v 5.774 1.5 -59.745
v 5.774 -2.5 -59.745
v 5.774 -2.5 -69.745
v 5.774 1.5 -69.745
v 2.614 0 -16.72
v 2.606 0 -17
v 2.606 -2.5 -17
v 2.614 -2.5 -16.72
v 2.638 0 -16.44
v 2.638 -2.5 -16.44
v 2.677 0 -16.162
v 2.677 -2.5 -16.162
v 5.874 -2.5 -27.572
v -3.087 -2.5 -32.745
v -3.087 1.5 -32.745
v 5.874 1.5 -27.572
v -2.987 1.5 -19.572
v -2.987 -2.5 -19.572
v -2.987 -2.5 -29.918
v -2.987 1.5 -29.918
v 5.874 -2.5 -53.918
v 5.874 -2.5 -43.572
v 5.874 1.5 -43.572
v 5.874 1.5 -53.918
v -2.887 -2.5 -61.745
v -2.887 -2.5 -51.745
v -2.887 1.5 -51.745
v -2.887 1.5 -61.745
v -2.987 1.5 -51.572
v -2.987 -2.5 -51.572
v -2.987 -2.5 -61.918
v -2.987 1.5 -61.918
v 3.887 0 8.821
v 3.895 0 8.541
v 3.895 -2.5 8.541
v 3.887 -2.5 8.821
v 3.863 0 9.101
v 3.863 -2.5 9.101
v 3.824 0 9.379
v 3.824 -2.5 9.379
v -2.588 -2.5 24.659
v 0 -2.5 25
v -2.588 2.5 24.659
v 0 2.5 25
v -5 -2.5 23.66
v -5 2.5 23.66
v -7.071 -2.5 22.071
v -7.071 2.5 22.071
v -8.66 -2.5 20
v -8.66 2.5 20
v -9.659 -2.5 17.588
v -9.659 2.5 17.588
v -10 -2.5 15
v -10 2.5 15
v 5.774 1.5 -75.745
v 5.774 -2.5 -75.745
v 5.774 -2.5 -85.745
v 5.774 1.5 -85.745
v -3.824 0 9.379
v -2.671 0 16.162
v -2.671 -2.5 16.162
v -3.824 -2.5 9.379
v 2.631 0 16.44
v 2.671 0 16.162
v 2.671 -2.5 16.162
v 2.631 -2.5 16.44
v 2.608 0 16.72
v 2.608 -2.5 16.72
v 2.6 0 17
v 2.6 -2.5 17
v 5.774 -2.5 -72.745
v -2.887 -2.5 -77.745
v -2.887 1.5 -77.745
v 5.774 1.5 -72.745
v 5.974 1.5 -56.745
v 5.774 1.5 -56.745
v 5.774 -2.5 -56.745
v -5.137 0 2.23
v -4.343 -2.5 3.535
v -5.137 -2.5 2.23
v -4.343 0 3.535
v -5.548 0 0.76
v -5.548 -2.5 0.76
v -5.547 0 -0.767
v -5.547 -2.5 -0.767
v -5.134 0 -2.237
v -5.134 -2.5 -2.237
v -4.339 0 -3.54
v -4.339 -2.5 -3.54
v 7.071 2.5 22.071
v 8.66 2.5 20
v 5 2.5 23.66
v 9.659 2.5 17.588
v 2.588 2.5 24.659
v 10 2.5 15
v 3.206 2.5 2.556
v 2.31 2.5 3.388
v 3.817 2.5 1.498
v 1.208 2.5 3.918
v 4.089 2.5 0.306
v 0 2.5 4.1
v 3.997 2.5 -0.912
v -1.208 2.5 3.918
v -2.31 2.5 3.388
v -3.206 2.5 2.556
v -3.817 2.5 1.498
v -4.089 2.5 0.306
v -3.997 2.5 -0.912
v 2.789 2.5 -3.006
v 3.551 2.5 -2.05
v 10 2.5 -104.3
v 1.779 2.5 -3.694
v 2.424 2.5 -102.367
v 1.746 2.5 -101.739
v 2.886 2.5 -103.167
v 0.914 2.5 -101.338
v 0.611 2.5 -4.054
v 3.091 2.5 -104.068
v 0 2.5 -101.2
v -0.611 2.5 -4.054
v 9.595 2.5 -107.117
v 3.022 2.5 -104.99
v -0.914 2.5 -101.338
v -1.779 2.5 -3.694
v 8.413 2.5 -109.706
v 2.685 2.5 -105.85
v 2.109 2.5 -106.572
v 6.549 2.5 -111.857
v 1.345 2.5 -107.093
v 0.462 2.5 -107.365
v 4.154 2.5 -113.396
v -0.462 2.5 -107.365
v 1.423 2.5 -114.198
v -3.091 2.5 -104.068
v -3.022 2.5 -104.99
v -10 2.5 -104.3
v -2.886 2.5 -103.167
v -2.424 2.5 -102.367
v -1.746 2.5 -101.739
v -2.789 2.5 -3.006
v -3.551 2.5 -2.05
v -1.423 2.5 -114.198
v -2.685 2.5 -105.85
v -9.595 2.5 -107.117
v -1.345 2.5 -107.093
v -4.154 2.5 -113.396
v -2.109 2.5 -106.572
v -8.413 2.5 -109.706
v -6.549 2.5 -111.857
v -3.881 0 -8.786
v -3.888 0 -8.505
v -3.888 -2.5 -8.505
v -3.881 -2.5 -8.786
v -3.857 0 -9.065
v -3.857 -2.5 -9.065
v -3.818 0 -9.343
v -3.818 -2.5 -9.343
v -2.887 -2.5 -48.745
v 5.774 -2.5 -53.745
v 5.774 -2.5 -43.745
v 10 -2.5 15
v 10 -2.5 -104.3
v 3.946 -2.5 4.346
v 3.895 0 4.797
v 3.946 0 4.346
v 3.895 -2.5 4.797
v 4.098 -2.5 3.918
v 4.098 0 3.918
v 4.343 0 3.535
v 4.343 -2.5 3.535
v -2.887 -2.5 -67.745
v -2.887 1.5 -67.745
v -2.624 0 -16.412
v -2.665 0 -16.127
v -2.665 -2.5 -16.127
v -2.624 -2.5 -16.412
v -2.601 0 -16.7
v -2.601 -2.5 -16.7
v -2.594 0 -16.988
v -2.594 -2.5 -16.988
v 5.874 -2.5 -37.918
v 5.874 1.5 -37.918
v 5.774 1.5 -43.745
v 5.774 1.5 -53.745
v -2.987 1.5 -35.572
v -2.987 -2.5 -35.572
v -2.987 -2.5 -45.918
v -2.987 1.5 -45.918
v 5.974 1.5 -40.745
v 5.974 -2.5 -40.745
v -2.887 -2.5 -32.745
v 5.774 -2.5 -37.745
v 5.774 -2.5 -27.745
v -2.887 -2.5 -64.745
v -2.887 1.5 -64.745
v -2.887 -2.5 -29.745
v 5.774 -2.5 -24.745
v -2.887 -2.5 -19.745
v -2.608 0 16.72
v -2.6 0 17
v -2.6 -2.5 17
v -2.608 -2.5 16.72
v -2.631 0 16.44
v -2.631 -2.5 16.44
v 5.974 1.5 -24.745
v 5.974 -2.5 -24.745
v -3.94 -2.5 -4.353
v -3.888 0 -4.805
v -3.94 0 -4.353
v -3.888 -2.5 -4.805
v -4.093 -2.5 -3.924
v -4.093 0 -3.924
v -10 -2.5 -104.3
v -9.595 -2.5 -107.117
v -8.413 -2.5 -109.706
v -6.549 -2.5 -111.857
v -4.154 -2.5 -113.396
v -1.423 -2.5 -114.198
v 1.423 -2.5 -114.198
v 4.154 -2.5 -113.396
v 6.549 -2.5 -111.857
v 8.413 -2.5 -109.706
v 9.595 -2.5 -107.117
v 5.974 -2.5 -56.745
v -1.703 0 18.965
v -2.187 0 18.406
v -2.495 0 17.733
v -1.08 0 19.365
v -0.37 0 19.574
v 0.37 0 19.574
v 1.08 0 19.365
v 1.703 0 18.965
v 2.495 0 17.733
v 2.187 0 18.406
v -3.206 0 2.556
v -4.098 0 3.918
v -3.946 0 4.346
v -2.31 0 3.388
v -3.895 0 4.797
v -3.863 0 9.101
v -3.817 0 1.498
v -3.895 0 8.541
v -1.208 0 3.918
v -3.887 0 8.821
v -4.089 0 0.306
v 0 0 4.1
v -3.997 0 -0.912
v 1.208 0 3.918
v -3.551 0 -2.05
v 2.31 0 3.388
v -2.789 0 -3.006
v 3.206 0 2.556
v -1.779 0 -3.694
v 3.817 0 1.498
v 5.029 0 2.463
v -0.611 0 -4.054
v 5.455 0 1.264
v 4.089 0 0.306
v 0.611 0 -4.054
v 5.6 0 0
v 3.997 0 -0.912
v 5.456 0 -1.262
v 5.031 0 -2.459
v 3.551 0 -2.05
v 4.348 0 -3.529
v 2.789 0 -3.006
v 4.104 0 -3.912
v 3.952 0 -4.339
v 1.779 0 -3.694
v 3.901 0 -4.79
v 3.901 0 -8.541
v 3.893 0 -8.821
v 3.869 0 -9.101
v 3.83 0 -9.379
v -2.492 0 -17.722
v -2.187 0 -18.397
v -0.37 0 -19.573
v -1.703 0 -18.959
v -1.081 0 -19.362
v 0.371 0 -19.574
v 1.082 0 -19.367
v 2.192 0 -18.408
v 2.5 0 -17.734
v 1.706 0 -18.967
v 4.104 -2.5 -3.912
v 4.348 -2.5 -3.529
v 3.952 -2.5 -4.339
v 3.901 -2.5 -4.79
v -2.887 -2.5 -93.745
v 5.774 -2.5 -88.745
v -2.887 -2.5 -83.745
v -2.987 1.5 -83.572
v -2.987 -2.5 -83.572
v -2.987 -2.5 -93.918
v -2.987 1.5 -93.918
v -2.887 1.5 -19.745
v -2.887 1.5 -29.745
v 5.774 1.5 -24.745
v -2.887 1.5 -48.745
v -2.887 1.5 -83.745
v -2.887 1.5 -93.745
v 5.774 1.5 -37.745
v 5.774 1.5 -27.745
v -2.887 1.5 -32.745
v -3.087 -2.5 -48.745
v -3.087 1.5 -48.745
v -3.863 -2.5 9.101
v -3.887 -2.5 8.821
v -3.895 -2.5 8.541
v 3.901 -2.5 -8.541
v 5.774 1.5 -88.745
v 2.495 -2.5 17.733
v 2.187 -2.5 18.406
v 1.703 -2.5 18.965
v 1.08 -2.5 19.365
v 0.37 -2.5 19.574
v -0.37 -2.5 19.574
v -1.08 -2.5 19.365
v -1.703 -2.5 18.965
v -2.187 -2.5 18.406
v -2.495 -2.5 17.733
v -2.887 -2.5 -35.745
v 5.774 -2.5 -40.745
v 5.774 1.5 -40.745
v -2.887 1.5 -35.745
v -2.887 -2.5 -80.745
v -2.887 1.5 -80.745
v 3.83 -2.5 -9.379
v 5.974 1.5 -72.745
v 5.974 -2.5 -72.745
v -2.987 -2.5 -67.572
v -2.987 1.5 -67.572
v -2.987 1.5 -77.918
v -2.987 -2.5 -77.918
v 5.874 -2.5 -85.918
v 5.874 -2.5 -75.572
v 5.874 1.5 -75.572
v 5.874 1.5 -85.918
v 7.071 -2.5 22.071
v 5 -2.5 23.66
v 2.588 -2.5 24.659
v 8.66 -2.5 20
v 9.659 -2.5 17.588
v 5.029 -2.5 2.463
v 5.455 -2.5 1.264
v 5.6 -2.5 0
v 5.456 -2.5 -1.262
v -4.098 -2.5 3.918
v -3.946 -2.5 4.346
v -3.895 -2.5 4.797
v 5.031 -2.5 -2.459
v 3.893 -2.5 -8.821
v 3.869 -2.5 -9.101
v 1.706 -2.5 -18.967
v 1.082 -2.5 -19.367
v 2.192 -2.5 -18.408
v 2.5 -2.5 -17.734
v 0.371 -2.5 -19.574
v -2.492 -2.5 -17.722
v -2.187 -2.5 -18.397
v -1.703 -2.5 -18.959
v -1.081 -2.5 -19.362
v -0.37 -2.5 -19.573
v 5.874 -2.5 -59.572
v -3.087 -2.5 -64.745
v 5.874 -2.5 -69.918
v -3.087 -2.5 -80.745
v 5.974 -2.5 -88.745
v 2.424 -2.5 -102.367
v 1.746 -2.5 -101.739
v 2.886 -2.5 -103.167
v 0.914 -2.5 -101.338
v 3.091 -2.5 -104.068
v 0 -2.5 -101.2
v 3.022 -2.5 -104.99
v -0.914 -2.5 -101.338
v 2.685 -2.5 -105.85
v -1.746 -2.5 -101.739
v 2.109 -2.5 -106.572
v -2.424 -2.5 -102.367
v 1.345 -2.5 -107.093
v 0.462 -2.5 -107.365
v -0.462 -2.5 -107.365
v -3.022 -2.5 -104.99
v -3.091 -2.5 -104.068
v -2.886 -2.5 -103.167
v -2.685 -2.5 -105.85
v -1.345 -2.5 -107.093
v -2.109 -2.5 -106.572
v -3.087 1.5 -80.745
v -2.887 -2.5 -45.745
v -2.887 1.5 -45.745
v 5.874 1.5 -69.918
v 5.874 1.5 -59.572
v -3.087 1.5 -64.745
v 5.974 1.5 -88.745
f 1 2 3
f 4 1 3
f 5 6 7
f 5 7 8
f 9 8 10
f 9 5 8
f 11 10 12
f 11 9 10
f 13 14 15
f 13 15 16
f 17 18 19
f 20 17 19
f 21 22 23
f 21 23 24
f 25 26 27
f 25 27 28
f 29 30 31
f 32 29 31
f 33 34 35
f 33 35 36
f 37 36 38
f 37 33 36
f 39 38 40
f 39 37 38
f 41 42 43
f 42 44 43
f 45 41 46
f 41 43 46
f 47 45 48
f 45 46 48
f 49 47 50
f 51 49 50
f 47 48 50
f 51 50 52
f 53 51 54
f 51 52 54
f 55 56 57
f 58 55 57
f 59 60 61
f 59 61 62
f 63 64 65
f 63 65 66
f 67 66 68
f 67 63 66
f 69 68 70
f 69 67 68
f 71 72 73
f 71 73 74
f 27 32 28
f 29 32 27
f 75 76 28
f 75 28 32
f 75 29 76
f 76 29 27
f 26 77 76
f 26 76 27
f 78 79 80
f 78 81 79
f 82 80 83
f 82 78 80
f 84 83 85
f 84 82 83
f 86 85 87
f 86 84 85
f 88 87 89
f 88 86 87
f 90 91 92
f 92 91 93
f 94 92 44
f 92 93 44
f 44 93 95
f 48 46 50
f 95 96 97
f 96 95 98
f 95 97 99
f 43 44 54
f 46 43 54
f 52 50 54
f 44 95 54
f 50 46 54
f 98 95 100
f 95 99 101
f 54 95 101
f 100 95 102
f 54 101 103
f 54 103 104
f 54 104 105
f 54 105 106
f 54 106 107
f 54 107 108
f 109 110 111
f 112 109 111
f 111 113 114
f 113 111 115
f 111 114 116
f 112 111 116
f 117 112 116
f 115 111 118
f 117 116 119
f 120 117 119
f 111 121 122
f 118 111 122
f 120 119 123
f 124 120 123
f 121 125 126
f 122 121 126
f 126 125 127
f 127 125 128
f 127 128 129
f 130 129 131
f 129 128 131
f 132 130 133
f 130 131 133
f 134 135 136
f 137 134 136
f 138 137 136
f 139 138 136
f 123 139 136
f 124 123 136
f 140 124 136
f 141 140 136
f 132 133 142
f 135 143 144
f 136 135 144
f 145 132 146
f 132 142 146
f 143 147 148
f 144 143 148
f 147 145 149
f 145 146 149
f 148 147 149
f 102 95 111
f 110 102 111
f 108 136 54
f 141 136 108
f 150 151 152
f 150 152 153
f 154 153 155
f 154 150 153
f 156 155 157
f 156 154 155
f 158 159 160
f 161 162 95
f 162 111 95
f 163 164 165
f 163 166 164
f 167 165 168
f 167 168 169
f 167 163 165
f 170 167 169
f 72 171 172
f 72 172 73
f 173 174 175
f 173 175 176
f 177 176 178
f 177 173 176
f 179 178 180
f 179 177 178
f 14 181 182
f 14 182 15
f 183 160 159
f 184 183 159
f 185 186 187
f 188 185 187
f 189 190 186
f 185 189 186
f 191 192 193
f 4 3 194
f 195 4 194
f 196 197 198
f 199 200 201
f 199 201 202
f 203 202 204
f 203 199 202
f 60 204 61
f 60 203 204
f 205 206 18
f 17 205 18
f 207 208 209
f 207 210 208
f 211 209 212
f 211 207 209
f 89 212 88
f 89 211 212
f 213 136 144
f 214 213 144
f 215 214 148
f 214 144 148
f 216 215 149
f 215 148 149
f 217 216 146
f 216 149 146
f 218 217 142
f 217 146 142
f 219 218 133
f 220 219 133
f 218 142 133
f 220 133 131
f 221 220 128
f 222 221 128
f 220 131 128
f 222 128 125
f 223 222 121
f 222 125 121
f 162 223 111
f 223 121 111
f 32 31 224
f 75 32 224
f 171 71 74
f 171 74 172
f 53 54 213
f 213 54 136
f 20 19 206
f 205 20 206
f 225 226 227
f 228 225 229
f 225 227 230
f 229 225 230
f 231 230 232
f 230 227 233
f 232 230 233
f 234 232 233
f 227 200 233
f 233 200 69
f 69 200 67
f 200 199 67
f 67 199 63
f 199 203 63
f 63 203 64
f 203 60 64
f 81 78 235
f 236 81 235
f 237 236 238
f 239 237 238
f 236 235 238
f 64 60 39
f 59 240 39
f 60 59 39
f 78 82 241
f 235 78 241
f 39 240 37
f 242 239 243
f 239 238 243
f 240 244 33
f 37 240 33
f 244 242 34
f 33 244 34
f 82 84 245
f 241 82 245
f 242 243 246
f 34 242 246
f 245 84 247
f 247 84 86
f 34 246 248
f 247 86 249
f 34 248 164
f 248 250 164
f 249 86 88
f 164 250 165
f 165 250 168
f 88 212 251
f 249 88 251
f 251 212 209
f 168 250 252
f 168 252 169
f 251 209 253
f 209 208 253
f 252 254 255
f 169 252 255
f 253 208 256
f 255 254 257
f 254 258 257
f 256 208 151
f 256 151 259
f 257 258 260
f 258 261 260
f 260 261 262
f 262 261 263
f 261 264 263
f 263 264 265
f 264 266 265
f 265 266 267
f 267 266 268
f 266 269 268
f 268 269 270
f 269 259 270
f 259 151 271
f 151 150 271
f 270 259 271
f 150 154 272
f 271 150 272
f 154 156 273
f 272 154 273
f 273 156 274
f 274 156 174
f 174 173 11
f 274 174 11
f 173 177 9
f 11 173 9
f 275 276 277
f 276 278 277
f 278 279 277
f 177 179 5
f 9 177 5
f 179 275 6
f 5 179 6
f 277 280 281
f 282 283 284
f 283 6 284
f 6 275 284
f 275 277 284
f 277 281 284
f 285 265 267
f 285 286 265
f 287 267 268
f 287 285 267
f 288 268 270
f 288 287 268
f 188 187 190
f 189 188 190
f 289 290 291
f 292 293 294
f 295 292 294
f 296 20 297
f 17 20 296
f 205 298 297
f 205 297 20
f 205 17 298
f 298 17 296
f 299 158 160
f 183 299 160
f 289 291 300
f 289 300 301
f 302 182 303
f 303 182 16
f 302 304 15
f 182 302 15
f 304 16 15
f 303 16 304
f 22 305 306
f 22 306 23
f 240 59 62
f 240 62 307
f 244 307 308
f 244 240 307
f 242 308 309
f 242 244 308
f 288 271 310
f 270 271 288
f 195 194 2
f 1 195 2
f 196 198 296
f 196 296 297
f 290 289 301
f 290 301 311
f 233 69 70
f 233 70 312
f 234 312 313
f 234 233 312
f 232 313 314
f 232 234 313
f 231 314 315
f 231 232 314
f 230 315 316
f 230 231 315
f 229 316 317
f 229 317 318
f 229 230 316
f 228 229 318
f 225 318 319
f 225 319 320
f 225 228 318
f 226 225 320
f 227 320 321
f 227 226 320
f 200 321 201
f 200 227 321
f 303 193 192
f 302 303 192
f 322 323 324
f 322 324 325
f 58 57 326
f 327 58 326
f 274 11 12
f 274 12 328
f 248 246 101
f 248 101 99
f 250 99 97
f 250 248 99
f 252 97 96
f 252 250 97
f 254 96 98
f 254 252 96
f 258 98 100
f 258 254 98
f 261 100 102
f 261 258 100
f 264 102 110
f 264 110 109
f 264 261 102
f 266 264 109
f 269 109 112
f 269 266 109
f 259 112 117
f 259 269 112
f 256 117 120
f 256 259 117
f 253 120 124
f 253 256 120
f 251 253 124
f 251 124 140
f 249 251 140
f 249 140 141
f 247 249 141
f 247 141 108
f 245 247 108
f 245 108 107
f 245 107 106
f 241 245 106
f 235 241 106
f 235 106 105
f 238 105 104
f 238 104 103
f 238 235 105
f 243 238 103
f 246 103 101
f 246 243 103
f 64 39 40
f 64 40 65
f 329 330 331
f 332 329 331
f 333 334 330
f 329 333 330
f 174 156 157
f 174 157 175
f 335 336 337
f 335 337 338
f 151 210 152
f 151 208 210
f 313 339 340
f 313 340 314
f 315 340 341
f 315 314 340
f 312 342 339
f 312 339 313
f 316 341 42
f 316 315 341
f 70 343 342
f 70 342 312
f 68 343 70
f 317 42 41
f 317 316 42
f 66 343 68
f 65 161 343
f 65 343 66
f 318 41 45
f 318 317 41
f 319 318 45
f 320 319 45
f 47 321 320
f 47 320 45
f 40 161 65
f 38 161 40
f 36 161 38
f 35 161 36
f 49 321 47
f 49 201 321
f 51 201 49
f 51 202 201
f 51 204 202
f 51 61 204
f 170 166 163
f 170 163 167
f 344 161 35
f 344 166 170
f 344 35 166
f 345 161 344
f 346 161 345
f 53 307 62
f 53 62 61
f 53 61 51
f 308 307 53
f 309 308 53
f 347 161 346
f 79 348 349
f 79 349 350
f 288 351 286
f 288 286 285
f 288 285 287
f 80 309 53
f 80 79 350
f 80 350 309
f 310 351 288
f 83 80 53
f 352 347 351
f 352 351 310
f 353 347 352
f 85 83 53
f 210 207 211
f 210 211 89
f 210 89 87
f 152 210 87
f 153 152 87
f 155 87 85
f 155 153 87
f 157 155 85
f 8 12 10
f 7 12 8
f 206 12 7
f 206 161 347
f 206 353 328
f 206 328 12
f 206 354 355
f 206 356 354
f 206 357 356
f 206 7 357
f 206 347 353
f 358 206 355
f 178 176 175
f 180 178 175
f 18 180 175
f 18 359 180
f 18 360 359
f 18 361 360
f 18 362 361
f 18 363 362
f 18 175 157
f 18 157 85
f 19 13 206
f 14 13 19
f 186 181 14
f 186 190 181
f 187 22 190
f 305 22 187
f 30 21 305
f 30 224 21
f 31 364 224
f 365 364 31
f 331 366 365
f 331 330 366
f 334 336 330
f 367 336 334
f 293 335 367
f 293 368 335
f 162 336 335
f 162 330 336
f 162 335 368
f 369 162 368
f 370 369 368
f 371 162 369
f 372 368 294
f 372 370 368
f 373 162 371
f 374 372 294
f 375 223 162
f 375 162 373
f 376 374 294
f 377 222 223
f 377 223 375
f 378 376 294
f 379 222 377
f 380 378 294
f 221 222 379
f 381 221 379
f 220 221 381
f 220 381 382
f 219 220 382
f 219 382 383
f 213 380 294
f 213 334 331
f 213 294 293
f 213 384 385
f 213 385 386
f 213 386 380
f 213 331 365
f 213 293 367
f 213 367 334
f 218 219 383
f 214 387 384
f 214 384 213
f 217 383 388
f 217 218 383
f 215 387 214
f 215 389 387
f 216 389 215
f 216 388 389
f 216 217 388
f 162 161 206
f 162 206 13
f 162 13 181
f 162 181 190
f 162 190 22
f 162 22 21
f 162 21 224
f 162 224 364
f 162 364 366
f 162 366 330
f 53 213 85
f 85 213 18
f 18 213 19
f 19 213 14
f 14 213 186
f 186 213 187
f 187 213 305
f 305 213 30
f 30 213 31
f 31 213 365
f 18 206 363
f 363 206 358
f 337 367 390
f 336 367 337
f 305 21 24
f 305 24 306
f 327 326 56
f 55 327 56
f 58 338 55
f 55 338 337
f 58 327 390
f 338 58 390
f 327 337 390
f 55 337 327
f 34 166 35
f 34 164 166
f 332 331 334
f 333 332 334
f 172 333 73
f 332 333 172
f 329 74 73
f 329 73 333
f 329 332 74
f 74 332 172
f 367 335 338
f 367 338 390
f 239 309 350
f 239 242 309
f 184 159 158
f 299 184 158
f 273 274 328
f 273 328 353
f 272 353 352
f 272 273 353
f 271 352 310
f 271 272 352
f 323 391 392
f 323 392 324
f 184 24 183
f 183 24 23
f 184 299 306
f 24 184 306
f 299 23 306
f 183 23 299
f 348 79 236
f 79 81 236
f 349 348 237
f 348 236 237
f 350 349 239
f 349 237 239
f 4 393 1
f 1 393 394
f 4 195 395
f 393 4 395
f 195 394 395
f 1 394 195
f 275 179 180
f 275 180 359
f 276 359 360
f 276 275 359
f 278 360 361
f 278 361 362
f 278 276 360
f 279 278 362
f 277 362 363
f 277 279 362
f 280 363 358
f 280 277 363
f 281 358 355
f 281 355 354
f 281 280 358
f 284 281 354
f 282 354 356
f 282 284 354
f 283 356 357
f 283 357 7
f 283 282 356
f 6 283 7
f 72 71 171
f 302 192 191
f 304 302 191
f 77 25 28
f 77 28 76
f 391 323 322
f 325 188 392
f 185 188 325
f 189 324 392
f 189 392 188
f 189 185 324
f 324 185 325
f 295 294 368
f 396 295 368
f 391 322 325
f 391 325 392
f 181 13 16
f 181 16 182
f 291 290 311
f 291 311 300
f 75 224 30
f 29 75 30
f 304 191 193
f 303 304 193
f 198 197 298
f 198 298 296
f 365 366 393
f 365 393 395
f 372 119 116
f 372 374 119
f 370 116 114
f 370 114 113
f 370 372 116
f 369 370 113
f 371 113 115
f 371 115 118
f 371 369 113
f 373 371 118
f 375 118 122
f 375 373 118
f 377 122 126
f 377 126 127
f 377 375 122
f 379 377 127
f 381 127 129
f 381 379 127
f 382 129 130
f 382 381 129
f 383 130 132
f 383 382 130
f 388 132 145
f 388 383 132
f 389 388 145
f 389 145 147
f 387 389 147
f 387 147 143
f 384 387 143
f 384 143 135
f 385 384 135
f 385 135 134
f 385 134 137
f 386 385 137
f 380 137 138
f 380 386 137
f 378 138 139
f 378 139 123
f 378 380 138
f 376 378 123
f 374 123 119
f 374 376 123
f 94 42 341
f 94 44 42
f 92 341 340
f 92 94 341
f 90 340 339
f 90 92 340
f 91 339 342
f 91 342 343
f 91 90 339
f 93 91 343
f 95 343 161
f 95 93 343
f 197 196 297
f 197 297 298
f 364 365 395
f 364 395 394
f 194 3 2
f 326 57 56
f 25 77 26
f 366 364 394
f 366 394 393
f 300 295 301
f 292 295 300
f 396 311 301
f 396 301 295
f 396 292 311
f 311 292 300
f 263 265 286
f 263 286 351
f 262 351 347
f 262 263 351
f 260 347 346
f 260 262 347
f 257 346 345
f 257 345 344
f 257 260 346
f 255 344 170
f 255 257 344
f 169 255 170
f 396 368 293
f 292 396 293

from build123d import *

# Parameters (mm, degrees)
SKETCH1_W           = 15
SKETCH1_H           = 45
BOSS_EXTRUDE1_DEPTH = 2.2
SKETCH1_3_W         = 20
SKETCH1_3_H         = 50
SKETCH1_3_W_2       = 15
SKETCH1_3_H_2       = 45
BOSS_EXTRUDE2_DEPTH = 2.5
SKETCH1_4_W         = 20
SKETCH1_4_H         = 50
SKETCH1_4_R         = 4.1
BOSS_EXTRUDE3_DEPTH = 2.5
FILLET1_R           = 2
SKETCH1_5_R         = 3.1
BOSS_EXTRUDE4_DEPTH = 2.5
FILLET2_R           = 10
SKETCH2_R           = 3.1
CUT_EXTRUDE1_DEPTH  = 4


with BuildPart() as part:
    # Sketch1 → Boss-Extrude1 (new body)
    with BuildSketch(Plane(origin=(0, 0, 0), x_dir=(1, 0, 0), z_dir=(0, 1, 0))):
        Rectangle(SKETCH1_W, SKETCH1_H)
        with BuildLine():
            ThreePointArc((-3.894544437, -4.023993492), (-5.599998379, 0.004260474), (-3.88841703, 4.029914763))
            Line((-3.88841703, 4.029914763), (-3.88841703, 8.505312122))
            ThreePointArc((-3.88841703, 8.505312122), (-3.870707724, 8.925763598), (-3.817705253, 9.343236712))
            Line((-3.817705253, 9.343236712), (-2.664584371, 16.126741161))
            ThreePointArc((-2.664584371, 16.126741161), (-2.610617779, 16.555799687), (-2.593926654, 16.987916591))
            ThreePointArc((-2.593926654, 16.987916591), (0, 19.6), (2.606045235, 17.000007028))
            ThreePointArc((2.606045235, 17.000007028), (2.623754541, 16.579555552), (2.676757012, 16.162082438))
            Line((2.676757012, 16.162082438), (3.829877895, 9.378577989))
            ThreePointArc((3.829877895, 9.378577989), (3.882880366, 8.961104875), (3.900589672, 8.540653399))
            Line((3.900589672, 8.540653399), (3.900589672, 4.018133922))
            ThreePointArc((3.900589672, 4.018133922), (5.157678846, 2.181364004), (5.6, 0))
            ThreePointArc((5.6, 0), (5.156037667, -2.185240393), (3.894544437, -4.023993492))
            Line((3.894544437, -4.023993492), (3.894544437, -8.540646372))
            ThreePointArc((3.894544437, -8.540646372), (3.876835131, -8.961097847), (3.82383266, -9.378570962))
            Line((3.82383266, -9.378570962), (2.670711777, -16.16207541))
            ThreePointArc((2.670711777, -16.16207541), (2.617709306, -16.579548524), (2.6, -17))
            ThreePointArc((2.6, -17), (0, -19.6), (-2.6, -17))
            ThreePointArc((-2.6, -17), (-2.617709306, -16.579548524), (-2.670711777, -16.16207541))
            Line((-2.670711777, -16.16207541), (-3.82383266, -9.378570962))
            ThreePointArc((-3.82383266, -9.378570962), (-3.876835131, -8.961097847), (-3.894544437, -8.540646372))
            Line((-3.894544437, -8.540646372), (-3.894544437, -4.023993492))
        make_face(mode=Mode.SUBTRACT)
    extrude(amount=-BOSS_EXTRUDE1_DEPTH)

    # Sketch1<3> → Boss-Extrude2 (add)
    # profile 1 of 2: a face of its own
    with BuildSketch(Plane(origin=(0, 0, 0), x_dir=(1, 0, 0), z_dir=(0, 1, 0))):
        Rectangle(SKETCH1_3_W, SKETCH1_3_H)
        Rectangle(SKETCH1_3_W_2, SKETCH1_3_H_2, mode=Mode.SUBTRACT)
    # profile 2 of 2: a face of its own
    with BuildSketch(Plane(origin=(0, 0, 0), x_dir=(1, 0, 0), z_dir=(0, 1, 0))):
        Rectangle(SKETCH1_3_W_2, SKETCH1_3_H_2)
        with BuildLine():
            ThreePointArc((-3.894544437, -4.023993492), (-5.599998379, 0.004260474), (-3.88841703, 4.029914763))
            Line((-3.88841703, 4.029914763), (-3.88841703, 8.505312122))
            ThreePointArc((-3.88841703, 8.505312122), (-3.870707724, 8.925763598), (-3.817705253, 9.343236712))
            Line((-3.817705253, 9.343236712), (-2.664584371, 16.126741161))
            ThreePointArc((-2.664584371, 16.126741161), (-2.610617779, 16.555799687), (-2.593926654, 16.987916591))
            ThreePointArc((-2.593926654, 16.987916591), (0, 19.6), (2.606045235, 17.000007028))
            ThreePointArc((2.606045235, 17.000007028), (2.623754541, 16.579555552), (2.676757012, 16.162082438))
            Line((2.676757012, 16.162082438), (3.829877895, 9.378577989))
            ThreePointArc((3.829877895, 9.378577989), (3.882880366, 8.961104875), (3.900589672, 8.540653399))
            Line((3.900589672, 8.540653399), (3.900589672, 4.018133922))
            ThreePointArc((3.900589672, 4.018133922), (5.157678846, 2.181364004), (5.6, 0))
            ThreePointArc((5.6, 0), (5.156037667, -2.185240393), (3.894544437, -4.023993492))
            Line((3.894544437, -4.023993492), (3.894544437, -8.540646372))
            ThreePointArc((3.894544437, -8.540646372), (3.876835131, -8.961097847), (3.82383266, -9.378570962))
            Line((3.82383266, -9.378570962), (2.670711777, -16.16207541))
            ThreePointArc((2.670711777, -16.16207541), (2.617709306, -16.579548524), (2.6, -17))
            ThreePointArc((2.6, -17), (0, -19.6), (-2.6, -17))
            ThreePointArc((-2.6, -17), (-2.617709306, -16.579548524), (-2.670711777, -16.16207541))
            Line((-2.670711777, -16.16207541), (-3.82383266, -9.378570962))
            ThreePointArc((-3.82383266, -9.378570962), (-3.876835131, -8.961097847), (-3.894544437, -8.540646372))
            Line((-3.894544437, -8.540646372), (-3.894544437, -4.023993492))
        make_face(mode=Mode.SUBTRACT)
    extrude(amount=-BOSS_EXTRUDE2_DEPTH)

    # Sketch1<4> → Boss-Extrude3 (add)
    with BuildSketch(Plane(origin=(0, 0, 0), x_dir=(1, 0, 0), z_dir=(0, 1, 0))):
        Rectangle(SKETCH1_4_W, SKETCH1_4_H)
        with Locations(Location((0, 0, 0), (0, 0, 270))):
            Circle(SKETCH1_4_R, mode=Mode.SUBTRACT)
    extrude(amount=BOSS_EXTRUDE3_DEPTH)

    # Fillet1
    fillet1_edges = [part.edges().sort_by_distance(p)[0] for p in [
        (-3.88841703, -1.25, -4.029914763),
        (-3.894544437, -1.25, 4.023993492),
        (3.894544437, -1.25, 4.023993492),
        (3.900589672, -1.25, -4.018133922),
    ]]
    fillet(fillet1_edges, radius=FILLET1_R)

    # Sketch1<5> → Boss-Extrude4 (add, symmetric)
    with BuildSketch(Plane(origin=(0, 0, 0), x_dir=(1, 0, 0), z_dir=(0, 1, 0))):
        with BuildLine():
            ThreePointArc((-10, 104.3), (0, 114.3), (10, 104.3))
            Line((10, 104.3), (10, 25))
            Line((10, 25), (-10, 25))
            Line((-10, 25), (-10, 104.3))
        make_face()
        with Locations(Location((0, 104.3, 0), (0, 0, 270))):
            Circle(SKETCH1_5_R, mode=Mode.SUBTRACT)
    extrude(amount=BOSS_EXTRUDE4_DEPTH, both=True)

    # Fillet2
    fillet2_edges = [part.edges().sort_by_distance(p)[0] for p in [
        (10, 0, 25),
        (-10, 0, 25),
    ]]
    fillet(fillet2_edges, radius=FILLET2_R - 0.0001)  # a hair under: the kernel refuses the full size

    # Sketch2 → Cut-Extrude1 (cut)
    # profile 1 of 10: a face of its own
    with BuildSketch(Plane.XZ.offset(2.5)):
        with Locations(Location((0, -104.3, 0), (0, 0, 90))):
            Circle(SKETCH2_R)
    # profile 2 of 10: a face of its own
    with BuildSketch(Plane.XZ.offset(2.5)):
        Polygon((-3.086751346, -80.744870683), (5.873502692, -75.571665602), (5.873502692, -85.918075763), align=None)
        Polygon((-2.886751346, -80.744870683), (5.773502692, -75.744870683), (5.773502692, -85.744870683), align=None, mode=Mode.SUBTRACT)
    # profile 3 of 10: a face of its own
    with BuildSketch(Plane.XZ.offset(2.5)):
        Polygon((5.973502692, -88.744870683), (-2.986751346, -83.571665602), (-2.986751346, -93.918075763), align=None)
        Polygon((-2.886751346, -83.744870683), (-2.886751346, -93.744870683), (5.773502692, -88.744870683), align=None, mode=Mode.SUBTRACT)
    # profile 4 of 10: a face of its own
    with BuildSketch(Plane.XZ.offset(2.5)):
        Polygon((5.973502692, -72.744870683), (-2.986751346, -67.571665602), (-2.986751346, -77.918075763), align=None)
        Polygon((5.773502692, -72.744870683), (-2.886751346, -67.744870683), (-2.886751346, -77.744870683), align=None, mode=Mode.SUBTRACT)
    # profile 5 of 10: a face of its own
    with BuildSketch(Plane.XZ.offset(2.5)):
        Polygon((5.973502692, -56.744870683), (-2.986751346, -51.571665602), (-2.986751346, -61.918075763), align=None)
        Polygon((5.773502692, -56.744870683), (-2.886751346, -51.744870683), (-2.886751346, -61.744870683), align=None, mode=Mode.SUBTRACT)
    # profile 6 of 10: a face of its own
    with BuildSketch(Plane.XZ.offset(2.5)):
        Polygon((5.973502692, -40.744870683), (-2.986751346, -35.571665602), (-2.986751346, -45.918075763), align=None)
        Polygon((5.773502692, -40.744870683), (-2.886751346, -35.744870683), (-2.886751346, -45.744870683), align=None, mode=Mode.SUBTRACT)
    # profile 7 of 10: a face of its own
    with BuildSketch(Plane.XZ.offset(2.5)):
        Polygon((5.973502692, -24.744870683), (-2.986751346, -19.571665602), (-2.986751346, -29.918075763), align=None)
        Polygon((5.773502692, -24.744870683), (-2.886751346, -19.744870683), (-2.886751346, -29.744870683), align=None, mode=Mode.SUBTRACT)
    # profile 8 of 10: a face of its own
    with BuildSketch(Plane.XZ.offset(2.5)):
        Polygon((-3.086751346, -64.744870683), (5.873502692, -59.571665602), (5.873502692, -69.918075763), align=None)
        Polygon((5.773502692, -69.744870683), (-2.886751346, -64.744870683), (5.773502692, -59.744870683), align=None, mode=Mode.SUBTRACT)
    # profile 9 of 10: a face of its own
    with BuildSketch(Plane.XZ.offset(2.5)):
        Polygon((-3.086751346, -48.744870683), (5.873502692, -43.571665602), (5.873502692, -53.918075763), align=None)
        Polygon((5.773502692, -53.744870683), (-2.886751346, -48.744870683), (5.773502692, -43.744870683), align=None, mode=Mode.SUBTRACT)
    # profile 10 of 10: a face of its own
    with BuildSketch(Plane.XZ.offset(2.5)):
        Polygon((-3.086751346, -32.744870683), (5.873502692, -27.571665602), (5.873502692, -37.918075763), align=None)
        Polygon((5.773502692, -37.744870683), (-2.886751346, -32.744870683), (5.773502692, -27.744870683), align=None, mode=Mode.SUBTRACT)
    extrude(amount=-CUT_EXTRUDE1_DEPTH, mode=Mode.SUBTRACT)


solid = part.part
